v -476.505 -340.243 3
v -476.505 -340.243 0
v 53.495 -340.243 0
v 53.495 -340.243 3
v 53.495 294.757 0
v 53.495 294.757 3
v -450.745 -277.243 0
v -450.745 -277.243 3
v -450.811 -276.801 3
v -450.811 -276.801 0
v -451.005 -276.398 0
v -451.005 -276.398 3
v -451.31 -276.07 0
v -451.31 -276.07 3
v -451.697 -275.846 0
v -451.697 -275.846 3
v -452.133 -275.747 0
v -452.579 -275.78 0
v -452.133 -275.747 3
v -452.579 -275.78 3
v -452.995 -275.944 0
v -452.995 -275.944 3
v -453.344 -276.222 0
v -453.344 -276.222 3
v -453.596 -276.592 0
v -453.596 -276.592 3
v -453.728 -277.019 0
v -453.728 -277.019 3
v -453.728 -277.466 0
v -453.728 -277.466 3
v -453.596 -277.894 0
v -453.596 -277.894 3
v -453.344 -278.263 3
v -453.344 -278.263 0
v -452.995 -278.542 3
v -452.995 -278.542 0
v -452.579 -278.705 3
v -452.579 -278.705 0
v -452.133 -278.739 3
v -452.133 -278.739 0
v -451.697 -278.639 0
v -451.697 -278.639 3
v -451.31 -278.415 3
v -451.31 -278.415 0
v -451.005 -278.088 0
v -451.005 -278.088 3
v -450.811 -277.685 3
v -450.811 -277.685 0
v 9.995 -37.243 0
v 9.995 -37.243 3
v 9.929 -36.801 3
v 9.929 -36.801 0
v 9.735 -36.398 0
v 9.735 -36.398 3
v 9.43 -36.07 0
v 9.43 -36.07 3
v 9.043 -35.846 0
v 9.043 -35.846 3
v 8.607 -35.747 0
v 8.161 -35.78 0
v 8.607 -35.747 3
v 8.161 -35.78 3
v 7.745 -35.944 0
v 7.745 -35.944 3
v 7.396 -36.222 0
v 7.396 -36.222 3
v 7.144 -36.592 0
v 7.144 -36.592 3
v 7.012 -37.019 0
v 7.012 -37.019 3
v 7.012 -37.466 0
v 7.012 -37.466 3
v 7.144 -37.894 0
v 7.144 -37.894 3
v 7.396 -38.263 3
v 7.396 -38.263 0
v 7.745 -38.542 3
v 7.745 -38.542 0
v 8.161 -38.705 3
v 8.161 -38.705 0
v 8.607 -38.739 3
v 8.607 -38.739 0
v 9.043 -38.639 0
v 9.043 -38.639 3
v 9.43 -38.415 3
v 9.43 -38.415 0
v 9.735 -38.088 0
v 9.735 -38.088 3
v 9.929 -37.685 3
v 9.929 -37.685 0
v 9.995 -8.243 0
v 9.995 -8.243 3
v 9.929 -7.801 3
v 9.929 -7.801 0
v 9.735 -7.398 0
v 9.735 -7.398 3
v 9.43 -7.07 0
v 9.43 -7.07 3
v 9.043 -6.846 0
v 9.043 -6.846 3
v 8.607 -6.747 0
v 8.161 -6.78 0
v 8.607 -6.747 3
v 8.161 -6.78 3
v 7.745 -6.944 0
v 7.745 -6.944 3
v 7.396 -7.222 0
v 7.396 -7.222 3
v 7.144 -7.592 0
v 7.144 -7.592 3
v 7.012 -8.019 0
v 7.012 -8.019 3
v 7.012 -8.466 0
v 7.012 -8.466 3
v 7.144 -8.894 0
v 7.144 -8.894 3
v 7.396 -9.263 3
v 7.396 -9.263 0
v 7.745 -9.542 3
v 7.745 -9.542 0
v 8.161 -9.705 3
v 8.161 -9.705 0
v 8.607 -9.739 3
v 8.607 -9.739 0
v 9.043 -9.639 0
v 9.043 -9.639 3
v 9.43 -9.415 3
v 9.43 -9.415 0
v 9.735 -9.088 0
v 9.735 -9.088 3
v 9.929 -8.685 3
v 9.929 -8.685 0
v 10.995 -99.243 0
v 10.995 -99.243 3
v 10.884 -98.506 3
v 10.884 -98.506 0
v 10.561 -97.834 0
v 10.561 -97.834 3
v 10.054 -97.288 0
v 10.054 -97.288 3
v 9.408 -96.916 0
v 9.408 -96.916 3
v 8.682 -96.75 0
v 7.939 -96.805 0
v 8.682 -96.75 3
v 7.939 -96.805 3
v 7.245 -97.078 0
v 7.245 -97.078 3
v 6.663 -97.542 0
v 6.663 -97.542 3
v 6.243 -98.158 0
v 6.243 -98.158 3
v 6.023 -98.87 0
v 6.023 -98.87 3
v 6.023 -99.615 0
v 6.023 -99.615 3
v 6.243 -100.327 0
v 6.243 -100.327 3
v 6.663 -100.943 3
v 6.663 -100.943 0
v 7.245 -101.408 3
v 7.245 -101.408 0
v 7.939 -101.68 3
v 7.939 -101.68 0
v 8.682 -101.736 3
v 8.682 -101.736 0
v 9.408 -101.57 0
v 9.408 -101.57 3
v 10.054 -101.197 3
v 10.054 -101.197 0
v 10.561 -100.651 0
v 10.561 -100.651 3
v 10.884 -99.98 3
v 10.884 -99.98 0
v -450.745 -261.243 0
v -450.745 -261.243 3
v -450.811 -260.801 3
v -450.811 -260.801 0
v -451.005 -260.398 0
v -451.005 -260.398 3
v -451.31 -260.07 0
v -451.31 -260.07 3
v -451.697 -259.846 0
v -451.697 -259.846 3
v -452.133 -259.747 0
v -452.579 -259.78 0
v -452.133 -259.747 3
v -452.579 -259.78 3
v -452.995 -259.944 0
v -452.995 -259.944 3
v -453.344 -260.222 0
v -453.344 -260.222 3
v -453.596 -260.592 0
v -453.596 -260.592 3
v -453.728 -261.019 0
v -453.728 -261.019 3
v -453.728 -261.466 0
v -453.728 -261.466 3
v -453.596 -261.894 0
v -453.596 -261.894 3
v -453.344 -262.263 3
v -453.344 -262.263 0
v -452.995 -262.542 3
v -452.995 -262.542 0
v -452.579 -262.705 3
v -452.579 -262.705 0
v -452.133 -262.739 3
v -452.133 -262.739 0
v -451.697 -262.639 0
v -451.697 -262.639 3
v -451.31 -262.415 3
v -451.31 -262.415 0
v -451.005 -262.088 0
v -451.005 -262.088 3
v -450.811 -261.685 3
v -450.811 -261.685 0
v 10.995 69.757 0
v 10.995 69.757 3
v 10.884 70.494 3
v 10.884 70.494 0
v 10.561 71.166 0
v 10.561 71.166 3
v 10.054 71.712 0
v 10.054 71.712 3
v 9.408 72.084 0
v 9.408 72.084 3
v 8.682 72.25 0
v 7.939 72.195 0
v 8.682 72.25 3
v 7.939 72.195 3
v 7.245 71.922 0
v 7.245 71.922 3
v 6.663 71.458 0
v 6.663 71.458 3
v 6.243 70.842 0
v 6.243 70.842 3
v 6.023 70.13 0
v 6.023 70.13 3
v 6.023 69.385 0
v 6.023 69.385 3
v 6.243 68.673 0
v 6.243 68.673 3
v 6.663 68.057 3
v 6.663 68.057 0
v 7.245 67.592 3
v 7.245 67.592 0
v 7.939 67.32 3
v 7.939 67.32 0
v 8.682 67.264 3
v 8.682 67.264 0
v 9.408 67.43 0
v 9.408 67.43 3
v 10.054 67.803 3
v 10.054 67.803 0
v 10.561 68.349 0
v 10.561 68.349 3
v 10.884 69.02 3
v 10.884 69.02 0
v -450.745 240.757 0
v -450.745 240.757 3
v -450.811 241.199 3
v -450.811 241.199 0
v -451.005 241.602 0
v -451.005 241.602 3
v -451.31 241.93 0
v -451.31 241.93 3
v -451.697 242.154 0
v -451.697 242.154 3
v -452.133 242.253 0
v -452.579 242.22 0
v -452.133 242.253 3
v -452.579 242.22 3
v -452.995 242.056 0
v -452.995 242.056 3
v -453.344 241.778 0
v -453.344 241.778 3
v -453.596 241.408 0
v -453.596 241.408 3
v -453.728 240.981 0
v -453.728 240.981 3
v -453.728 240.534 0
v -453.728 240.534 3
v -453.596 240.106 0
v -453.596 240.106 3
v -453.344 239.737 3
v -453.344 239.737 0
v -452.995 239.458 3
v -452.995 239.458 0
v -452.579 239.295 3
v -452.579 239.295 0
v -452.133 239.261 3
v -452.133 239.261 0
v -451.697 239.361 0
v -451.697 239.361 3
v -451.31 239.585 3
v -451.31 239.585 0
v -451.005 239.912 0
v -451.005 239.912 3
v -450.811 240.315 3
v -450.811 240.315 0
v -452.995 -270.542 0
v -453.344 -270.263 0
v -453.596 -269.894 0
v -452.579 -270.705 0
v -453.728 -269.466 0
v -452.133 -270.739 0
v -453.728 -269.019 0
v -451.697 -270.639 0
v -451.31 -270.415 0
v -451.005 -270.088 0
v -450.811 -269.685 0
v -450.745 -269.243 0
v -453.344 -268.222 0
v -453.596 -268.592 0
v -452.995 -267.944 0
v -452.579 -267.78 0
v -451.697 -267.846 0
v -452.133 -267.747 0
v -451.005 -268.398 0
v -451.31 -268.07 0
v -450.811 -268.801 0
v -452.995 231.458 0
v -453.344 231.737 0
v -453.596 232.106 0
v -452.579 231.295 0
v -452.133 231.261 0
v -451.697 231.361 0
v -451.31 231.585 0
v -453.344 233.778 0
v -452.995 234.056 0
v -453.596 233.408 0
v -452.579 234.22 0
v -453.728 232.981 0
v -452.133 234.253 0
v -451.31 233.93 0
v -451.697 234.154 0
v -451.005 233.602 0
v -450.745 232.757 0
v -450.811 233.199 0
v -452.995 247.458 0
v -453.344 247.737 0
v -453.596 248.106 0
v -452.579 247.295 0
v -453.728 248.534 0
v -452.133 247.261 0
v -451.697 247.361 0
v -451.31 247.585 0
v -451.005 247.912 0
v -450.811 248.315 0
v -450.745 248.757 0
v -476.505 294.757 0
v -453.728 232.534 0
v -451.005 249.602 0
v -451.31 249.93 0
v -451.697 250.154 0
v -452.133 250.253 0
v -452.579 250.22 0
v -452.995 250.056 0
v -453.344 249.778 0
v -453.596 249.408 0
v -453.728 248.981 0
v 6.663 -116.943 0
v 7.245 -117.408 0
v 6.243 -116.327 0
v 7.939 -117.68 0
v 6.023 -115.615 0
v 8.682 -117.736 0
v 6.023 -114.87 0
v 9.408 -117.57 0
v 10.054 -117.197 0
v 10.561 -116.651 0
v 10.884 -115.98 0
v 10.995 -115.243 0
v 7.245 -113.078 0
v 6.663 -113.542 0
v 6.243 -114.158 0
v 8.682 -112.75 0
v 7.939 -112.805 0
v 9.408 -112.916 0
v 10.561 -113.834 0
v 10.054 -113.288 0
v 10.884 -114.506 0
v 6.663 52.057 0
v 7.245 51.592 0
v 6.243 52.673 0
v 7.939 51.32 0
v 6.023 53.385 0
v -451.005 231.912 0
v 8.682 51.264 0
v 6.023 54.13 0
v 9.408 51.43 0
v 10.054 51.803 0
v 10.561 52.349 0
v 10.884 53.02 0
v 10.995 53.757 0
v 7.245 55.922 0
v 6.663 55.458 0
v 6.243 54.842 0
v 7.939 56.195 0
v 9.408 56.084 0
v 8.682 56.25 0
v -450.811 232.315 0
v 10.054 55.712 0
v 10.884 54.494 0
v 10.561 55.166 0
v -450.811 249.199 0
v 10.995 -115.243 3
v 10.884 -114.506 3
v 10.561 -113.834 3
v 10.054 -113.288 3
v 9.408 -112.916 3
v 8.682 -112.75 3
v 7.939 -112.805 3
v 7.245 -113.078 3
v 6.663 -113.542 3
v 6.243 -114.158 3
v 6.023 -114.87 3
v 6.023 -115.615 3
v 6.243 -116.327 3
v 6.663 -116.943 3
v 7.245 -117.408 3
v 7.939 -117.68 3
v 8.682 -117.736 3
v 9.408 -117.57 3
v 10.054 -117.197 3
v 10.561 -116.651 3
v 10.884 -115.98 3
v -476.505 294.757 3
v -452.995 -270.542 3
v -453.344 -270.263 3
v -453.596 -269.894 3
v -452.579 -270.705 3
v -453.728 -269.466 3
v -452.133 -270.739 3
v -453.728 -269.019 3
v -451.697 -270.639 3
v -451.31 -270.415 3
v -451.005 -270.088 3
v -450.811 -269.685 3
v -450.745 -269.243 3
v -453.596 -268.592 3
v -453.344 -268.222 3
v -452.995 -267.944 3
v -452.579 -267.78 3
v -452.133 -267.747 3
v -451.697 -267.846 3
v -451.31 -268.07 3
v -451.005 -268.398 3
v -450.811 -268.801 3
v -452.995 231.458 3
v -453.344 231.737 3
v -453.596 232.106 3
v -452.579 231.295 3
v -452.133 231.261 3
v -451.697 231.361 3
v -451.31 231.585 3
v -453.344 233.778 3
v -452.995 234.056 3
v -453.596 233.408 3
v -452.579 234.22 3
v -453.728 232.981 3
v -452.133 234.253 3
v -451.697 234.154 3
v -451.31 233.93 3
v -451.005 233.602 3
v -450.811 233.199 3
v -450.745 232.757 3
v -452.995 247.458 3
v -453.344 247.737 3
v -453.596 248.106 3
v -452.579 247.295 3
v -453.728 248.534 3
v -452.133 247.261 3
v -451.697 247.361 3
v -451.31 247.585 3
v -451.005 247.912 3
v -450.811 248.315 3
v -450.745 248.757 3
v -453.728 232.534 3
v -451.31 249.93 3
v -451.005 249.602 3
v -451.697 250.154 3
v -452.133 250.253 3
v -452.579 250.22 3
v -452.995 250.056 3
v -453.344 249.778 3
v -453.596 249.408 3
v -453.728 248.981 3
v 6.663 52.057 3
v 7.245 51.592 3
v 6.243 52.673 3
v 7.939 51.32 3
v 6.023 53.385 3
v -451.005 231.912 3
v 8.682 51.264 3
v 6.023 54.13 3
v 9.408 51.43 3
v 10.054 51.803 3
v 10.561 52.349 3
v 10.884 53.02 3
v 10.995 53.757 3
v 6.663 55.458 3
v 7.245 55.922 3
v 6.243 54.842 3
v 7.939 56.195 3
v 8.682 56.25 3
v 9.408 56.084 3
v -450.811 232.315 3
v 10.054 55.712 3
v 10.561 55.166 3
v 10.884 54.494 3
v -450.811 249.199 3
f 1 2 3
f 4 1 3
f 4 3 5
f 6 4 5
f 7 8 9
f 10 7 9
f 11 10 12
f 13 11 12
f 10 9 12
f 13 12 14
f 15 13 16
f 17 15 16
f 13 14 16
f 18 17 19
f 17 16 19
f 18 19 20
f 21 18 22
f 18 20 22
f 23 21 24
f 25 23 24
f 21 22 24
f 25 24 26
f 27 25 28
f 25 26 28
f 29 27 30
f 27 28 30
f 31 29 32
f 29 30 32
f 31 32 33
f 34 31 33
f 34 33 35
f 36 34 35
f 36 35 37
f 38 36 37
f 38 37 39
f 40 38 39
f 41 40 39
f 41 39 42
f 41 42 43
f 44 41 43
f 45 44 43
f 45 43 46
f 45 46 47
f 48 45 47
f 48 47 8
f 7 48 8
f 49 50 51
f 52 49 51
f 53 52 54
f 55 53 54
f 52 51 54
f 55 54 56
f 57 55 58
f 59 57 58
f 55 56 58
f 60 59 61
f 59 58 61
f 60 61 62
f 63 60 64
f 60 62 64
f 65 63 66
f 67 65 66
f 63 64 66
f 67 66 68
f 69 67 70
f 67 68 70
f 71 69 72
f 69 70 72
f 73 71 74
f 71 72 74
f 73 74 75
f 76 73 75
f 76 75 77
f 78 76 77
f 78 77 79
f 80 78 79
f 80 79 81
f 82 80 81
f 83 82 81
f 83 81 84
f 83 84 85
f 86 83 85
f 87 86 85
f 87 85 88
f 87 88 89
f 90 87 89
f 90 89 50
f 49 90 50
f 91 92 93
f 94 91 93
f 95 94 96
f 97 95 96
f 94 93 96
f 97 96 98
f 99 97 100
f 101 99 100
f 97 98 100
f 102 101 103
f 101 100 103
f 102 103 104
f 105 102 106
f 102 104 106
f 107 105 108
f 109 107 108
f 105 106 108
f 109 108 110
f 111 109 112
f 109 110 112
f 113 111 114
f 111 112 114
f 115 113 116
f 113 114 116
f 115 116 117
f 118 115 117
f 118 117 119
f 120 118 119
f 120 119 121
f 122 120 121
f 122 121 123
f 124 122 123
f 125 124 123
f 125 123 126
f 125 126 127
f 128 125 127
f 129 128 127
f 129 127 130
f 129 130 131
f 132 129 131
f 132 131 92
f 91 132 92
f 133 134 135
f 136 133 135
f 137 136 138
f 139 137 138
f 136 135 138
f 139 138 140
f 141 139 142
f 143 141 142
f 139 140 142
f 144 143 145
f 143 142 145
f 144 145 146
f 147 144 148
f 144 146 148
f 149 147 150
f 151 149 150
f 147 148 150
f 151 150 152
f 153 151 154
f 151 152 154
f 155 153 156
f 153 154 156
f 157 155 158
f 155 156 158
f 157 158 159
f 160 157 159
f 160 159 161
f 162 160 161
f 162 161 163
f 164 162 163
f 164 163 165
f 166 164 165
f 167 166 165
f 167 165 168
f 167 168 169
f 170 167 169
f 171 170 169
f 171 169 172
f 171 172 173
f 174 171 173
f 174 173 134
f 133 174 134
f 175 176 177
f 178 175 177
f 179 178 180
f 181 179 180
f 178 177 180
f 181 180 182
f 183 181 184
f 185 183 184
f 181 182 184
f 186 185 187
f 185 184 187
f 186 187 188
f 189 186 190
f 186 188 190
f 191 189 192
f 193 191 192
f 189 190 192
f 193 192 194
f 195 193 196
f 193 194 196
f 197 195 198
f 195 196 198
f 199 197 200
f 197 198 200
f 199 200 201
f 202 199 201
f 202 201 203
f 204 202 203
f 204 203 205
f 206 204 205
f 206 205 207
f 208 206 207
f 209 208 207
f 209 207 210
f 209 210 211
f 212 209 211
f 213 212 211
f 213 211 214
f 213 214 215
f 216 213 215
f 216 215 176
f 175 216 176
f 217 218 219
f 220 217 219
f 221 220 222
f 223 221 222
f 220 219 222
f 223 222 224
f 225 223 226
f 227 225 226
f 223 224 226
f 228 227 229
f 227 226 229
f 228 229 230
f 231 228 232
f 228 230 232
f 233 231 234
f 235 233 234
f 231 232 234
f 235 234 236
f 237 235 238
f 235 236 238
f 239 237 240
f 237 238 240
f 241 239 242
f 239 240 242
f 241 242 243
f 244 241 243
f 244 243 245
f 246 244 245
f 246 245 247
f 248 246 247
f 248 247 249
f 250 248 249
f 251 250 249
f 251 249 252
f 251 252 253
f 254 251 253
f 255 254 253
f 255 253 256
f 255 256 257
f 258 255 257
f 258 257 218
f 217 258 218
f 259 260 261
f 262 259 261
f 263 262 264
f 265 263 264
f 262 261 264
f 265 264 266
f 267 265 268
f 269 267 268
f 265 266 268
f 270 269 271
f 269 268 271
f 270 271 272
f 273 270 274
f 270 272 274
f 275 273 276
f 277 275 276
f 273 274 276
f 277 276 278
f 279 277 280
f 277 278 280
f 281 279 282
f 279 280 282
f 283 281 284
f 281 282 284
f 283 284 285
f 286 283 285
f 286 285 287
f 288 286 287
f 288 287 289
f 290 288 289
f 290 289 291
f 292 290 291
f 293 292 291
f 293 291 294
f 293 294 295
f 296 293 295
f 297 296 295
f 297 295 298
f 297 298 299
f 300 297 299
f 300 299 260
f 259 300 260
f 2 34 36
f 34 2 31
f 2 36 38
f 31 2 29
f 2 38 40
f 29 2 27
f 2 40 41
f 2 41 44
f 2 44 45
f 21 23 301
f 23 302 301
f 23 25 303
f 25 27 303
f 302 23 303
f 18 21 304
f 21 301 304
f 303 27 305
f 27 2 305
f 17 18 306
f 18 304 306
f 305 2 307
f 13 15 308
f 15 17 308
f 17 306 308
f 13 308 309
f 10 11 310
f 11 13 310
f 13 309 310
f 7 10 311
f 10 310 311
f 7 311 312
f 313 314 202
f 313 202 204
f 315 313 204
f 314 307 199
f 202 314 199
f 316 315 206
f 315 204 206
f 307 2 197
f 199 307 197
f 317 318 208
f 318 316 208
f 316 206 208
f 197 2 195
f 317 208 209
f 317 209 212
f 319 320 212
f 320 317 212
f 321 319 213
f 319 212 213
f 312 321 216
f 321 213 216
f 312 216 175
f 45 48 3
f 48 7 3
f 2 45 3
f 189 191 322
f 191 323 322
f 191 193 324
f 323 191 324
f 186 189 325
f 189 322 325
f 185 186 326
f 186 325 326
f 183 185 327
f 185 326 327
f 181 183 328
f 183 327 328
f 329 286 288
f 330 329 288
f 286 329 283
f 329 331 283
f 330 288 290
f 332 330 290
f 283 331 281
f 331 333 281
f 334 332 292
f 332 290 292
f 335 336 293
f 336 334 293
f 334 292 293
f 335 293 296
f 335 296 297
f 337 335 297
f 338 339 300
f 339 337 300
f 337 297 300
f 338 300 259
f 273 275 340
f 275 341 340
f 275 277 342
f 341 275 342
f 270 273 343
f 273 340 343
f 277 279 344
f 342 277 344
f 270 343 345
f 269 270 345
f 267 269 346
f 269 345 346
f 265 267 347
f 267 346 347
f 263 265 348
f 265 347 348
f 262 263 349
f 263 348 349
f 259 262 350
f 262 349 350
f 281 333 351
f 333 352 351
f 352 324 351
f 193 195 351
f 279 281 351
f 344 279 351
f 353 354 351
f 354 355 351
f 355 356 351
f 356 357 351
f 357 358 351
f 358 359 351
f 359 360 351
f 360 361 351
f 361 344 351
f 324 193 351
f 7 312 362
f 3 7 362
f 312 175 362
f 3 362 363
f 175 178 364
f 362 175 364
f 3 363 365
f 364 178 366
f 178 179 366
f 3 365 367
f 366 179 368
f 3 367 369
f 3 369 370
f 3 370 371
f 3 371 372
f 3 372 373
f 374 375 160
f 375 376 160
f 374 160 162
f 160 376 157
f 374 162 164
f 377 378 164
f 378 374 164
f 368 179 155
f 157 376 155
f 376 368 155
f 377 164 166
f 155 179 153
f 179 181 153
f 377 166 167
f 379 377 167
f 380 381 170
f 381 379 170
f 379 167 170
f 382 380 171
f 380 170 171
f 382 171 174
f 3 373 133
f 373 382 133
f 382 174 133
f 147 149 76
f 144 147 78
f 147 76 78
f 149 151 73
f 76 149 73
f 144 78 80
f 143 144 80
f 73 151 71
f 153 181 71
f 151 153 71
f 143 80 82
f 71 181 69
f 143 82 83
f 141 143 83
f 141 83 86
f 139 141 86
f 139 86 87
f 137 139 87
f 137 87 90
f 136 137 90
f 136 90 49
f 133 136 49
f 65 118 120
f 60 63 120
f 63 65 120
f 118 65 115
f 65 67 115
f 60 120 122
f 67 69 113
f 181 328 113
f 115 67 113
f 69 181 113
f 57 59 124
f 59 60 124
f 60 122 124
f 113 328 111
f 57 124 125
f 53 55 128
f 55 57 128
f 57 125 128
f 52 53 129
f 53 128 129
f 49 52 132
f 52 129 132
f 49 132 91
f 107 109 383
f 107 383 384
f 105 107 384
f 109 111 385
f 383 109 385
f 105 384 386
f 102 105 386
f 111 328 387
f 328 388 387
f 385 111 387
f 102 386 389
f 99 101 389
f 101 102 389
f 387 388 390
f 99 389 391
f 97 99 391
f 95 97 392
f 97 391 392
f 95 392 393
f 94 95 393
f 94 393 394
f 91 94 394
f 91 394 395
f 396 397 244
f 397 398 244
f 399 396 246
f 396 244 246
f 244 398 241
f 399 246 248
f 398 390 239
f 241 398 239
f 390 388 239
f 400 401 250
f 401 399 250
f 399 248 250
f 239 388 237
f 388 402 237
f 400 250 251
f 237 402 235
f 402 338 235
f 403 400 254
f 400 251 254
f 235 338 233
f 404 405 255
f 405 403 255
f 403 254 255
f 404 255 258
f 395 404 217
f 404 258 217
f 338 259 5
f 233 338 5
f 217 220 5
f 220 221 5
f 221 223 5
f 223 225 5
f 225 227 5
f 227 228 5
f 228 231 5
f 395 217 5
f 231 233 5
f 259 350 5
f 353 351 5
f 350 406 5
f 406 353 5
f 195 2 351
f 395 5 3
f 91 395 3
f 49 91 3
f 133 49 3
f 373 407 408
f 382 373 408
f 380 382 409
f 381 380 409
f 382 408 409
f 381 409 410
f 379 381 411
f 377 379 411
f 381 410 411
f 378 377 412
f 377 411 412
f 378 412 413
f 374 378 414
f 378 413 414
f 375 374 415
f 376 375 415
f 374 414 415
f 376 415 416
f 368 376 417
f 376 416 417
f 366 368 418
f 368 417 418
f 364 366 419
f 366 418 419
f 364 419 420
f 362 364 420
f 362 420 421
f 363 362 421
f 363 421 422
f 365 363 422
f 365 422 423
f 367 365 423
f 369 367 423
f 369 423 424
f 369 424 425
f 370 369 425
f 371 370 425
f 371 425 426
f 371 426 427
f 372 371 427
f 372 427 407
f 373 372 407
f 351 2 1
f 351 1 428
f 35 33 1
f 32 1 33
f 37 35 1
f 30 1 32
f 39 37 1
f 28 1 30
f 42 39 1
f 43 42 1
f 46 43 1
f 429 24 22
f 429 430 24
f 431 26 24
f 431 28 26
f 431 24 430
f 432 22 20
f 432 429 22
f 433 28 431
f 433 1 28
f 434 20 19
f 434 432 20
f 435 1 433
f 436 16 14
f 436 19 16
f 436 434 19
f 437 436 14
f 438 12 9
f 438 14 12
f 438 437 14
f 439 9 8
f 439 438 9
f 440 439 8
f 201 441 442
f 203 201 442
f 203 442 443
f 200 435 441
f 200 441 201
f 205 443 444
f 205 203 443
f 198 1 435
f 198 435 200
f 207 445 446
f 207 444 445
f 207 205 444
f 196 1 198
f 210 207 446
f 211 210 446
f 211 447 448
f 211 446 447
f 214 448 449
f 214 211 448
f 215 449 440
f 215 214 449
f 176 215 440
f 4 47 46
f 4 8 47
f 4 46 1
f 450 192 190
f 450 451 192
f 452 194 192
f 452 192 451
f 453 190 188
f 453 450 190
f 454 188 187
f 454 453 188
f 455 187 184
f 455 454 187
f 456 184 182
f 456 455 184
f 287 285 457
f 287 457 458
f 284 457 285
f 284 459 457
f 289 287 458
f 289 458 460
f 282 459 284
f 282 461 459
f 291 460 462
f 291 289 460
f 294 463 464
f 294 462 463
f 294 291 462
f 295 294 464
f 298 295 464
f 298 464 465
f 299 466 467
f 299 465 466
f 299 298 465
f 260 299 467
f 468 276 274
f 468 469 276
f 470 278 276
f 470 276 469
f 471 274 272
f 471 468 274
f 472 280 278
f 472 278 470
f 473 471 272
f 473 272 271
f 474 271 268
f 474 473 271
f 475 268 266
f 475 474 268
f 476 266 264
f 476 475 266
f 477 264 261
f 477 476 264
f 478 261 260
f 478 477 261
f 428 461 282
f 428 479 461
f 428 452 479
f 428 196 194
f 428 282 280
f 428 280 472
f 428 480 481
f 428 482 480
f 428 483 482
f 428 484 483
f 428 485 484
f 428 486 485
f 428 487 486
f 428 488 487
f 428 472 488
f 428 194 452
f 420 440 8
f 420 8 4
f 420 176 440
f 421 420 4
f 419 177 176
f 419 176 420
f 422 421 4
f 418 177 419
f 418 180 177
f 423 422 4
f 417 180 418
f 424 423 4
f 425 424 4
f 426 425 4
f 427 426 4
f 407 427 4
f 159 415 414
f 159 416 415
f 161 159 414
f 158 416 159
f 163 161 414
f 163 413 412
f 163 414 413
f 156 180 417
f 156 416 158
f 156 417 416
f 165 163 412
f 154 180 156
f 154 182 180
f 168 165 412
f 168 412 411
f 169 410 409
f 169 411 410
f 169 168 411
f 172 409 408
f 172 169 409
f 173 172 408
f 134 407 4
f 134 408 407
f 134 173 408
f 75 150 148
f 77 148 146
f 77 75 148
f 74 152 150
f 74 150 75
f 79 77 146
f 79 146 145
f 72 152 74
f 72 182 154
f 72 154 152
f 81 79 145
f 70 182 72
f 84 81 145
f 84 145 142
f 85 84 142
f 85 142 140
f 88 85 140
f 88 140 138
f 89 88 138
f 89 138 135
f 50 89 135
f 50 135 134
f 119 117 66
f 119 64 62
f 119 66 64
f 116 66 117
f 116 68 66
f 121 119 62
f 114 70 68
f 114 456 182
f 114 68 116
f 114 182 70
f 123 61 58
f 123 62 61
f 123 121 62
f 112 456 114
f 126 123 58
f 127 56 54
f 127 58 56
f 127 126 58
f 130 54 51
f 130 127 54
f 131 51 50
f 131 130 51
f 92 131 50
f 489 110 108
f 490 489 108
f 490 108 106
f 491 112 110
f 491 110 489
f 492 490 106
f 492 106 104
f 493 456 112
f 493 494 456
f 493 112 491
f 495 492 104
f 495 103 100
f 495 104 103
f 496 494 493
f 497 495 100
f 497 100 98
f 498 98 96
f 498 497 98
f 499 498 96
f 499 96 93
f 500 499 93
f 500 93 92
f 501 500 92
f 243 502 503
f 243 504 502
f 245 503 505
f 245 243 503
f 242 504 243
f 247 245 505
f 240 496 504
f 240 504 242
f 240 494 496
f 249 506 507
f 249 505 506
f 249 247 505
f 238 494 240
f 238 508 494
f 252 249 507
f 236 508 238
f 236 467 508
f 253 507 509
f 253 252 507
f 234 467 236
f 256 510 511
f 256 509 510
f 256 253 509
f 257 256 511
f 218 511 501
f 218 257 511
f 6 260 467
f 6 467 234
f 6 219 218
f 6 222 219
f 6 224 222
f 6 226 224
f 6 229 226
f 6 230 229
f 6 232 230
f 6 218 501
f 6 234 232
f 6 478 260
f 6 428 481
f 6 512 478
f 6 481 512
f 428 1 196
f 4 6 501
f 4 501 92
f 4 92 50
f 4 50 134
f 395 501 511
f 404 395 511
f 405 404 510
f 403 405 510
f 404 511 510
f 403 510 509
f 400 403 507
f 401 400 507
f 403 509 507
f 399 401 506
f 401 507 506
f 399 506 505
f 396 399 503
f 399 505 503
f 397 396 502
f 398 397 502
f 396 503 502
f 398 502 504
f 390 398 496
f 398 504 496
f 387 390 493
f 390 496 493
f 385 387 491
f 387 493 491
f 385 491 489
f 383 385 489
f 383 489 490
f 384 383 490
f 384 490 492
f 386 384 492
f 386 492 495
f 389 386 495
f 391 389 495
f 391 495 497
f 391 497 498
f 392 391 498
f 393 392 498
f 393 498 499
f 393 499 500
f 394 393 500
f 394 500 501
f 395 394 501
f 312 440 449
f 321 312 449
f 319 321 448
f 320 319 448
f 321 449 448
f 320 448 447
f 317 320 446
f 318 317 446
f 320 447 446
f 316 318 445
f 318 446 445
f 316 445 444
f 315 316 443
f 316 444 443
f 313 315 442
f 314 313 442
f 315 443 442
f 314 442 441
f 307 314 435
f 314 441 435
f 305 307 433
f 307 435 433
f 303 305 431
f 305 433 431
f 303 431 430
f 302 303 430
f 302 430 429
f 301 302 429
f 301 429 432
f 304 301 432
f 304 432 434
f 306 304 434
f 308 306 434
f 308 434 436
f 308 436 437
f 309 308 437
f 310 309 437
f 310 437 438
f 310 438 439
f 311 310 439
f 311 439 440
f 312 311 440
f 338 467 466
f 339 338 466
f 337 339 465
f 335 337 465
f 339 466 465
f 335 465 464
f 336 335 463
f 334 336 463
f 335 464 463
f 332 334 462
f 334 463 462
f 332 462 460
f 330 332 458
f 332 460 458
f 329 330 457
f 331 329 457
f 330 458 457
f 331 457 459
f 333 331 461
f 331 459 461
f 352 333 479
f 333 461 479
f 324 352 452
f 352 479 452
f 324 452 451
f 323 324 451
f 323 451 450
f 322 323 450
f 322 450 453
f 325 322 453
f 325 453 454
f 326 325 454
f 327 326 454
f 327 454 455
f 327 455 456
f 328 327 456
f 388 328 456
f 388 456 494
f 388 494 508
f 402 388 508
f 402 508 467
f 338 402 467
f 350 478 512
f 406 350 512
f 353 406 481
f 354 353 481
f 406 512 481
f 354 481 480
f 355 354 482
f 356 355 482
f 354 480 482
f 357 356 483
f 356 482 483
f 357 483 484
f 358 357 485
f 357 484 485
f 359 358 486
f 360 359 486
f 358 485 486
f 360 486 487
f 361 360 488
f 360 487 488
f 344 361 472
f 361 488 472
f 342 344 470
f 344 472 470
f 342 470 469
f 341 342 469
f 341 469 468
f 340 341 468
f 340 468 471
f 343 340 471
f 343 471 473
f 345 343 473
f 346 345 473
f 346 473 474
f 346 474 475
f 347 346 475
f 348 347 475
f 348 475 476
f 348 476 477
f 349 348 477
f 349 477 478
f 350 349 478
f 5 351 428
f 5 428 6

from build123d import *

# Parameters (mm, degrees)
SKETCH1_W           = 530
SKETCH1_H           = 635
BOSS_EXTRUDE1_DEPTH = 3
SKETCH2_R           = 1.5
CUT_EXTRUDE1_DEPTH  = 586.517705704
SKETCH3_R           = 2.5
SKETCH3_R_2         = 1.5
CUT_EXTRUDE2_DEPTH  = 586.517705704


with BuildPart() as part:
    # Sketch1 → Boss-Extrude1 (new body)
    with BuildSketch(Plane.XY):
        with Locations((-211.504854369, -22.742718447)):
            Rectangle(SKETCH1_W, SKETCH1_H)
    extrude(amount=BOSS_EXTRUDE1_DEPTH)

    # Sketch2 → Cut-Extrude1 (cut, through all)
    with BuildSketch(Plane.XY.offset(3)):
        with Locations((-452.244854369, 248.757281553)):
            Circle(SKETCH2_R)
        with Locations((-452.244854369, 240.757281553)):
            Circle(SKETCH2_R)
        with Locations((-452.244854369, 232.757281553)):
            Circle(SKETCH2_R)
        with Locations((-452.244854369, -261.242718447)):
            Circle(SKETCH2_R)
        with Locations((-452.244854369, -269.242718447)):
            Circle(SKETCH2_R)
        with Locations((-452.244854369, -277.242718447)):
            Circle(SKETCH2_R)
    extrude(amount=-CUT_EXTRUDE1_DEPTH, mode=Mode.SUBTRACT)

    # Sketch3 → Cut-Extrude2 (cut, through all)
    with BuildSketch(Plane.XY.offset(3)):
        with Locations((8.495145631, 69.757281553)):
            Circle(SKETCH3_R)
        with Locations((8.495145631, 53.757281553)):
            Circle(SKETCH3_R)
        with Locations((8.495145631, -99.242718447)):
            Circle(SKETCH3_R)
        with Locations((8.495145631, -115.242718447)):
            Circle(SKETCH3_R)
        with Locations((8.495145631, -37.242718447)):
            Circle(SKETCH3_R_2)
        with Locations((8.495145631, -8.242718447)):
            Circle(SKETCH3_R_2)
    extrude(amount=-CUT_EXTRUDE2_DEPTH, mode=Mode.SUBTRACT)


solid = part.part
